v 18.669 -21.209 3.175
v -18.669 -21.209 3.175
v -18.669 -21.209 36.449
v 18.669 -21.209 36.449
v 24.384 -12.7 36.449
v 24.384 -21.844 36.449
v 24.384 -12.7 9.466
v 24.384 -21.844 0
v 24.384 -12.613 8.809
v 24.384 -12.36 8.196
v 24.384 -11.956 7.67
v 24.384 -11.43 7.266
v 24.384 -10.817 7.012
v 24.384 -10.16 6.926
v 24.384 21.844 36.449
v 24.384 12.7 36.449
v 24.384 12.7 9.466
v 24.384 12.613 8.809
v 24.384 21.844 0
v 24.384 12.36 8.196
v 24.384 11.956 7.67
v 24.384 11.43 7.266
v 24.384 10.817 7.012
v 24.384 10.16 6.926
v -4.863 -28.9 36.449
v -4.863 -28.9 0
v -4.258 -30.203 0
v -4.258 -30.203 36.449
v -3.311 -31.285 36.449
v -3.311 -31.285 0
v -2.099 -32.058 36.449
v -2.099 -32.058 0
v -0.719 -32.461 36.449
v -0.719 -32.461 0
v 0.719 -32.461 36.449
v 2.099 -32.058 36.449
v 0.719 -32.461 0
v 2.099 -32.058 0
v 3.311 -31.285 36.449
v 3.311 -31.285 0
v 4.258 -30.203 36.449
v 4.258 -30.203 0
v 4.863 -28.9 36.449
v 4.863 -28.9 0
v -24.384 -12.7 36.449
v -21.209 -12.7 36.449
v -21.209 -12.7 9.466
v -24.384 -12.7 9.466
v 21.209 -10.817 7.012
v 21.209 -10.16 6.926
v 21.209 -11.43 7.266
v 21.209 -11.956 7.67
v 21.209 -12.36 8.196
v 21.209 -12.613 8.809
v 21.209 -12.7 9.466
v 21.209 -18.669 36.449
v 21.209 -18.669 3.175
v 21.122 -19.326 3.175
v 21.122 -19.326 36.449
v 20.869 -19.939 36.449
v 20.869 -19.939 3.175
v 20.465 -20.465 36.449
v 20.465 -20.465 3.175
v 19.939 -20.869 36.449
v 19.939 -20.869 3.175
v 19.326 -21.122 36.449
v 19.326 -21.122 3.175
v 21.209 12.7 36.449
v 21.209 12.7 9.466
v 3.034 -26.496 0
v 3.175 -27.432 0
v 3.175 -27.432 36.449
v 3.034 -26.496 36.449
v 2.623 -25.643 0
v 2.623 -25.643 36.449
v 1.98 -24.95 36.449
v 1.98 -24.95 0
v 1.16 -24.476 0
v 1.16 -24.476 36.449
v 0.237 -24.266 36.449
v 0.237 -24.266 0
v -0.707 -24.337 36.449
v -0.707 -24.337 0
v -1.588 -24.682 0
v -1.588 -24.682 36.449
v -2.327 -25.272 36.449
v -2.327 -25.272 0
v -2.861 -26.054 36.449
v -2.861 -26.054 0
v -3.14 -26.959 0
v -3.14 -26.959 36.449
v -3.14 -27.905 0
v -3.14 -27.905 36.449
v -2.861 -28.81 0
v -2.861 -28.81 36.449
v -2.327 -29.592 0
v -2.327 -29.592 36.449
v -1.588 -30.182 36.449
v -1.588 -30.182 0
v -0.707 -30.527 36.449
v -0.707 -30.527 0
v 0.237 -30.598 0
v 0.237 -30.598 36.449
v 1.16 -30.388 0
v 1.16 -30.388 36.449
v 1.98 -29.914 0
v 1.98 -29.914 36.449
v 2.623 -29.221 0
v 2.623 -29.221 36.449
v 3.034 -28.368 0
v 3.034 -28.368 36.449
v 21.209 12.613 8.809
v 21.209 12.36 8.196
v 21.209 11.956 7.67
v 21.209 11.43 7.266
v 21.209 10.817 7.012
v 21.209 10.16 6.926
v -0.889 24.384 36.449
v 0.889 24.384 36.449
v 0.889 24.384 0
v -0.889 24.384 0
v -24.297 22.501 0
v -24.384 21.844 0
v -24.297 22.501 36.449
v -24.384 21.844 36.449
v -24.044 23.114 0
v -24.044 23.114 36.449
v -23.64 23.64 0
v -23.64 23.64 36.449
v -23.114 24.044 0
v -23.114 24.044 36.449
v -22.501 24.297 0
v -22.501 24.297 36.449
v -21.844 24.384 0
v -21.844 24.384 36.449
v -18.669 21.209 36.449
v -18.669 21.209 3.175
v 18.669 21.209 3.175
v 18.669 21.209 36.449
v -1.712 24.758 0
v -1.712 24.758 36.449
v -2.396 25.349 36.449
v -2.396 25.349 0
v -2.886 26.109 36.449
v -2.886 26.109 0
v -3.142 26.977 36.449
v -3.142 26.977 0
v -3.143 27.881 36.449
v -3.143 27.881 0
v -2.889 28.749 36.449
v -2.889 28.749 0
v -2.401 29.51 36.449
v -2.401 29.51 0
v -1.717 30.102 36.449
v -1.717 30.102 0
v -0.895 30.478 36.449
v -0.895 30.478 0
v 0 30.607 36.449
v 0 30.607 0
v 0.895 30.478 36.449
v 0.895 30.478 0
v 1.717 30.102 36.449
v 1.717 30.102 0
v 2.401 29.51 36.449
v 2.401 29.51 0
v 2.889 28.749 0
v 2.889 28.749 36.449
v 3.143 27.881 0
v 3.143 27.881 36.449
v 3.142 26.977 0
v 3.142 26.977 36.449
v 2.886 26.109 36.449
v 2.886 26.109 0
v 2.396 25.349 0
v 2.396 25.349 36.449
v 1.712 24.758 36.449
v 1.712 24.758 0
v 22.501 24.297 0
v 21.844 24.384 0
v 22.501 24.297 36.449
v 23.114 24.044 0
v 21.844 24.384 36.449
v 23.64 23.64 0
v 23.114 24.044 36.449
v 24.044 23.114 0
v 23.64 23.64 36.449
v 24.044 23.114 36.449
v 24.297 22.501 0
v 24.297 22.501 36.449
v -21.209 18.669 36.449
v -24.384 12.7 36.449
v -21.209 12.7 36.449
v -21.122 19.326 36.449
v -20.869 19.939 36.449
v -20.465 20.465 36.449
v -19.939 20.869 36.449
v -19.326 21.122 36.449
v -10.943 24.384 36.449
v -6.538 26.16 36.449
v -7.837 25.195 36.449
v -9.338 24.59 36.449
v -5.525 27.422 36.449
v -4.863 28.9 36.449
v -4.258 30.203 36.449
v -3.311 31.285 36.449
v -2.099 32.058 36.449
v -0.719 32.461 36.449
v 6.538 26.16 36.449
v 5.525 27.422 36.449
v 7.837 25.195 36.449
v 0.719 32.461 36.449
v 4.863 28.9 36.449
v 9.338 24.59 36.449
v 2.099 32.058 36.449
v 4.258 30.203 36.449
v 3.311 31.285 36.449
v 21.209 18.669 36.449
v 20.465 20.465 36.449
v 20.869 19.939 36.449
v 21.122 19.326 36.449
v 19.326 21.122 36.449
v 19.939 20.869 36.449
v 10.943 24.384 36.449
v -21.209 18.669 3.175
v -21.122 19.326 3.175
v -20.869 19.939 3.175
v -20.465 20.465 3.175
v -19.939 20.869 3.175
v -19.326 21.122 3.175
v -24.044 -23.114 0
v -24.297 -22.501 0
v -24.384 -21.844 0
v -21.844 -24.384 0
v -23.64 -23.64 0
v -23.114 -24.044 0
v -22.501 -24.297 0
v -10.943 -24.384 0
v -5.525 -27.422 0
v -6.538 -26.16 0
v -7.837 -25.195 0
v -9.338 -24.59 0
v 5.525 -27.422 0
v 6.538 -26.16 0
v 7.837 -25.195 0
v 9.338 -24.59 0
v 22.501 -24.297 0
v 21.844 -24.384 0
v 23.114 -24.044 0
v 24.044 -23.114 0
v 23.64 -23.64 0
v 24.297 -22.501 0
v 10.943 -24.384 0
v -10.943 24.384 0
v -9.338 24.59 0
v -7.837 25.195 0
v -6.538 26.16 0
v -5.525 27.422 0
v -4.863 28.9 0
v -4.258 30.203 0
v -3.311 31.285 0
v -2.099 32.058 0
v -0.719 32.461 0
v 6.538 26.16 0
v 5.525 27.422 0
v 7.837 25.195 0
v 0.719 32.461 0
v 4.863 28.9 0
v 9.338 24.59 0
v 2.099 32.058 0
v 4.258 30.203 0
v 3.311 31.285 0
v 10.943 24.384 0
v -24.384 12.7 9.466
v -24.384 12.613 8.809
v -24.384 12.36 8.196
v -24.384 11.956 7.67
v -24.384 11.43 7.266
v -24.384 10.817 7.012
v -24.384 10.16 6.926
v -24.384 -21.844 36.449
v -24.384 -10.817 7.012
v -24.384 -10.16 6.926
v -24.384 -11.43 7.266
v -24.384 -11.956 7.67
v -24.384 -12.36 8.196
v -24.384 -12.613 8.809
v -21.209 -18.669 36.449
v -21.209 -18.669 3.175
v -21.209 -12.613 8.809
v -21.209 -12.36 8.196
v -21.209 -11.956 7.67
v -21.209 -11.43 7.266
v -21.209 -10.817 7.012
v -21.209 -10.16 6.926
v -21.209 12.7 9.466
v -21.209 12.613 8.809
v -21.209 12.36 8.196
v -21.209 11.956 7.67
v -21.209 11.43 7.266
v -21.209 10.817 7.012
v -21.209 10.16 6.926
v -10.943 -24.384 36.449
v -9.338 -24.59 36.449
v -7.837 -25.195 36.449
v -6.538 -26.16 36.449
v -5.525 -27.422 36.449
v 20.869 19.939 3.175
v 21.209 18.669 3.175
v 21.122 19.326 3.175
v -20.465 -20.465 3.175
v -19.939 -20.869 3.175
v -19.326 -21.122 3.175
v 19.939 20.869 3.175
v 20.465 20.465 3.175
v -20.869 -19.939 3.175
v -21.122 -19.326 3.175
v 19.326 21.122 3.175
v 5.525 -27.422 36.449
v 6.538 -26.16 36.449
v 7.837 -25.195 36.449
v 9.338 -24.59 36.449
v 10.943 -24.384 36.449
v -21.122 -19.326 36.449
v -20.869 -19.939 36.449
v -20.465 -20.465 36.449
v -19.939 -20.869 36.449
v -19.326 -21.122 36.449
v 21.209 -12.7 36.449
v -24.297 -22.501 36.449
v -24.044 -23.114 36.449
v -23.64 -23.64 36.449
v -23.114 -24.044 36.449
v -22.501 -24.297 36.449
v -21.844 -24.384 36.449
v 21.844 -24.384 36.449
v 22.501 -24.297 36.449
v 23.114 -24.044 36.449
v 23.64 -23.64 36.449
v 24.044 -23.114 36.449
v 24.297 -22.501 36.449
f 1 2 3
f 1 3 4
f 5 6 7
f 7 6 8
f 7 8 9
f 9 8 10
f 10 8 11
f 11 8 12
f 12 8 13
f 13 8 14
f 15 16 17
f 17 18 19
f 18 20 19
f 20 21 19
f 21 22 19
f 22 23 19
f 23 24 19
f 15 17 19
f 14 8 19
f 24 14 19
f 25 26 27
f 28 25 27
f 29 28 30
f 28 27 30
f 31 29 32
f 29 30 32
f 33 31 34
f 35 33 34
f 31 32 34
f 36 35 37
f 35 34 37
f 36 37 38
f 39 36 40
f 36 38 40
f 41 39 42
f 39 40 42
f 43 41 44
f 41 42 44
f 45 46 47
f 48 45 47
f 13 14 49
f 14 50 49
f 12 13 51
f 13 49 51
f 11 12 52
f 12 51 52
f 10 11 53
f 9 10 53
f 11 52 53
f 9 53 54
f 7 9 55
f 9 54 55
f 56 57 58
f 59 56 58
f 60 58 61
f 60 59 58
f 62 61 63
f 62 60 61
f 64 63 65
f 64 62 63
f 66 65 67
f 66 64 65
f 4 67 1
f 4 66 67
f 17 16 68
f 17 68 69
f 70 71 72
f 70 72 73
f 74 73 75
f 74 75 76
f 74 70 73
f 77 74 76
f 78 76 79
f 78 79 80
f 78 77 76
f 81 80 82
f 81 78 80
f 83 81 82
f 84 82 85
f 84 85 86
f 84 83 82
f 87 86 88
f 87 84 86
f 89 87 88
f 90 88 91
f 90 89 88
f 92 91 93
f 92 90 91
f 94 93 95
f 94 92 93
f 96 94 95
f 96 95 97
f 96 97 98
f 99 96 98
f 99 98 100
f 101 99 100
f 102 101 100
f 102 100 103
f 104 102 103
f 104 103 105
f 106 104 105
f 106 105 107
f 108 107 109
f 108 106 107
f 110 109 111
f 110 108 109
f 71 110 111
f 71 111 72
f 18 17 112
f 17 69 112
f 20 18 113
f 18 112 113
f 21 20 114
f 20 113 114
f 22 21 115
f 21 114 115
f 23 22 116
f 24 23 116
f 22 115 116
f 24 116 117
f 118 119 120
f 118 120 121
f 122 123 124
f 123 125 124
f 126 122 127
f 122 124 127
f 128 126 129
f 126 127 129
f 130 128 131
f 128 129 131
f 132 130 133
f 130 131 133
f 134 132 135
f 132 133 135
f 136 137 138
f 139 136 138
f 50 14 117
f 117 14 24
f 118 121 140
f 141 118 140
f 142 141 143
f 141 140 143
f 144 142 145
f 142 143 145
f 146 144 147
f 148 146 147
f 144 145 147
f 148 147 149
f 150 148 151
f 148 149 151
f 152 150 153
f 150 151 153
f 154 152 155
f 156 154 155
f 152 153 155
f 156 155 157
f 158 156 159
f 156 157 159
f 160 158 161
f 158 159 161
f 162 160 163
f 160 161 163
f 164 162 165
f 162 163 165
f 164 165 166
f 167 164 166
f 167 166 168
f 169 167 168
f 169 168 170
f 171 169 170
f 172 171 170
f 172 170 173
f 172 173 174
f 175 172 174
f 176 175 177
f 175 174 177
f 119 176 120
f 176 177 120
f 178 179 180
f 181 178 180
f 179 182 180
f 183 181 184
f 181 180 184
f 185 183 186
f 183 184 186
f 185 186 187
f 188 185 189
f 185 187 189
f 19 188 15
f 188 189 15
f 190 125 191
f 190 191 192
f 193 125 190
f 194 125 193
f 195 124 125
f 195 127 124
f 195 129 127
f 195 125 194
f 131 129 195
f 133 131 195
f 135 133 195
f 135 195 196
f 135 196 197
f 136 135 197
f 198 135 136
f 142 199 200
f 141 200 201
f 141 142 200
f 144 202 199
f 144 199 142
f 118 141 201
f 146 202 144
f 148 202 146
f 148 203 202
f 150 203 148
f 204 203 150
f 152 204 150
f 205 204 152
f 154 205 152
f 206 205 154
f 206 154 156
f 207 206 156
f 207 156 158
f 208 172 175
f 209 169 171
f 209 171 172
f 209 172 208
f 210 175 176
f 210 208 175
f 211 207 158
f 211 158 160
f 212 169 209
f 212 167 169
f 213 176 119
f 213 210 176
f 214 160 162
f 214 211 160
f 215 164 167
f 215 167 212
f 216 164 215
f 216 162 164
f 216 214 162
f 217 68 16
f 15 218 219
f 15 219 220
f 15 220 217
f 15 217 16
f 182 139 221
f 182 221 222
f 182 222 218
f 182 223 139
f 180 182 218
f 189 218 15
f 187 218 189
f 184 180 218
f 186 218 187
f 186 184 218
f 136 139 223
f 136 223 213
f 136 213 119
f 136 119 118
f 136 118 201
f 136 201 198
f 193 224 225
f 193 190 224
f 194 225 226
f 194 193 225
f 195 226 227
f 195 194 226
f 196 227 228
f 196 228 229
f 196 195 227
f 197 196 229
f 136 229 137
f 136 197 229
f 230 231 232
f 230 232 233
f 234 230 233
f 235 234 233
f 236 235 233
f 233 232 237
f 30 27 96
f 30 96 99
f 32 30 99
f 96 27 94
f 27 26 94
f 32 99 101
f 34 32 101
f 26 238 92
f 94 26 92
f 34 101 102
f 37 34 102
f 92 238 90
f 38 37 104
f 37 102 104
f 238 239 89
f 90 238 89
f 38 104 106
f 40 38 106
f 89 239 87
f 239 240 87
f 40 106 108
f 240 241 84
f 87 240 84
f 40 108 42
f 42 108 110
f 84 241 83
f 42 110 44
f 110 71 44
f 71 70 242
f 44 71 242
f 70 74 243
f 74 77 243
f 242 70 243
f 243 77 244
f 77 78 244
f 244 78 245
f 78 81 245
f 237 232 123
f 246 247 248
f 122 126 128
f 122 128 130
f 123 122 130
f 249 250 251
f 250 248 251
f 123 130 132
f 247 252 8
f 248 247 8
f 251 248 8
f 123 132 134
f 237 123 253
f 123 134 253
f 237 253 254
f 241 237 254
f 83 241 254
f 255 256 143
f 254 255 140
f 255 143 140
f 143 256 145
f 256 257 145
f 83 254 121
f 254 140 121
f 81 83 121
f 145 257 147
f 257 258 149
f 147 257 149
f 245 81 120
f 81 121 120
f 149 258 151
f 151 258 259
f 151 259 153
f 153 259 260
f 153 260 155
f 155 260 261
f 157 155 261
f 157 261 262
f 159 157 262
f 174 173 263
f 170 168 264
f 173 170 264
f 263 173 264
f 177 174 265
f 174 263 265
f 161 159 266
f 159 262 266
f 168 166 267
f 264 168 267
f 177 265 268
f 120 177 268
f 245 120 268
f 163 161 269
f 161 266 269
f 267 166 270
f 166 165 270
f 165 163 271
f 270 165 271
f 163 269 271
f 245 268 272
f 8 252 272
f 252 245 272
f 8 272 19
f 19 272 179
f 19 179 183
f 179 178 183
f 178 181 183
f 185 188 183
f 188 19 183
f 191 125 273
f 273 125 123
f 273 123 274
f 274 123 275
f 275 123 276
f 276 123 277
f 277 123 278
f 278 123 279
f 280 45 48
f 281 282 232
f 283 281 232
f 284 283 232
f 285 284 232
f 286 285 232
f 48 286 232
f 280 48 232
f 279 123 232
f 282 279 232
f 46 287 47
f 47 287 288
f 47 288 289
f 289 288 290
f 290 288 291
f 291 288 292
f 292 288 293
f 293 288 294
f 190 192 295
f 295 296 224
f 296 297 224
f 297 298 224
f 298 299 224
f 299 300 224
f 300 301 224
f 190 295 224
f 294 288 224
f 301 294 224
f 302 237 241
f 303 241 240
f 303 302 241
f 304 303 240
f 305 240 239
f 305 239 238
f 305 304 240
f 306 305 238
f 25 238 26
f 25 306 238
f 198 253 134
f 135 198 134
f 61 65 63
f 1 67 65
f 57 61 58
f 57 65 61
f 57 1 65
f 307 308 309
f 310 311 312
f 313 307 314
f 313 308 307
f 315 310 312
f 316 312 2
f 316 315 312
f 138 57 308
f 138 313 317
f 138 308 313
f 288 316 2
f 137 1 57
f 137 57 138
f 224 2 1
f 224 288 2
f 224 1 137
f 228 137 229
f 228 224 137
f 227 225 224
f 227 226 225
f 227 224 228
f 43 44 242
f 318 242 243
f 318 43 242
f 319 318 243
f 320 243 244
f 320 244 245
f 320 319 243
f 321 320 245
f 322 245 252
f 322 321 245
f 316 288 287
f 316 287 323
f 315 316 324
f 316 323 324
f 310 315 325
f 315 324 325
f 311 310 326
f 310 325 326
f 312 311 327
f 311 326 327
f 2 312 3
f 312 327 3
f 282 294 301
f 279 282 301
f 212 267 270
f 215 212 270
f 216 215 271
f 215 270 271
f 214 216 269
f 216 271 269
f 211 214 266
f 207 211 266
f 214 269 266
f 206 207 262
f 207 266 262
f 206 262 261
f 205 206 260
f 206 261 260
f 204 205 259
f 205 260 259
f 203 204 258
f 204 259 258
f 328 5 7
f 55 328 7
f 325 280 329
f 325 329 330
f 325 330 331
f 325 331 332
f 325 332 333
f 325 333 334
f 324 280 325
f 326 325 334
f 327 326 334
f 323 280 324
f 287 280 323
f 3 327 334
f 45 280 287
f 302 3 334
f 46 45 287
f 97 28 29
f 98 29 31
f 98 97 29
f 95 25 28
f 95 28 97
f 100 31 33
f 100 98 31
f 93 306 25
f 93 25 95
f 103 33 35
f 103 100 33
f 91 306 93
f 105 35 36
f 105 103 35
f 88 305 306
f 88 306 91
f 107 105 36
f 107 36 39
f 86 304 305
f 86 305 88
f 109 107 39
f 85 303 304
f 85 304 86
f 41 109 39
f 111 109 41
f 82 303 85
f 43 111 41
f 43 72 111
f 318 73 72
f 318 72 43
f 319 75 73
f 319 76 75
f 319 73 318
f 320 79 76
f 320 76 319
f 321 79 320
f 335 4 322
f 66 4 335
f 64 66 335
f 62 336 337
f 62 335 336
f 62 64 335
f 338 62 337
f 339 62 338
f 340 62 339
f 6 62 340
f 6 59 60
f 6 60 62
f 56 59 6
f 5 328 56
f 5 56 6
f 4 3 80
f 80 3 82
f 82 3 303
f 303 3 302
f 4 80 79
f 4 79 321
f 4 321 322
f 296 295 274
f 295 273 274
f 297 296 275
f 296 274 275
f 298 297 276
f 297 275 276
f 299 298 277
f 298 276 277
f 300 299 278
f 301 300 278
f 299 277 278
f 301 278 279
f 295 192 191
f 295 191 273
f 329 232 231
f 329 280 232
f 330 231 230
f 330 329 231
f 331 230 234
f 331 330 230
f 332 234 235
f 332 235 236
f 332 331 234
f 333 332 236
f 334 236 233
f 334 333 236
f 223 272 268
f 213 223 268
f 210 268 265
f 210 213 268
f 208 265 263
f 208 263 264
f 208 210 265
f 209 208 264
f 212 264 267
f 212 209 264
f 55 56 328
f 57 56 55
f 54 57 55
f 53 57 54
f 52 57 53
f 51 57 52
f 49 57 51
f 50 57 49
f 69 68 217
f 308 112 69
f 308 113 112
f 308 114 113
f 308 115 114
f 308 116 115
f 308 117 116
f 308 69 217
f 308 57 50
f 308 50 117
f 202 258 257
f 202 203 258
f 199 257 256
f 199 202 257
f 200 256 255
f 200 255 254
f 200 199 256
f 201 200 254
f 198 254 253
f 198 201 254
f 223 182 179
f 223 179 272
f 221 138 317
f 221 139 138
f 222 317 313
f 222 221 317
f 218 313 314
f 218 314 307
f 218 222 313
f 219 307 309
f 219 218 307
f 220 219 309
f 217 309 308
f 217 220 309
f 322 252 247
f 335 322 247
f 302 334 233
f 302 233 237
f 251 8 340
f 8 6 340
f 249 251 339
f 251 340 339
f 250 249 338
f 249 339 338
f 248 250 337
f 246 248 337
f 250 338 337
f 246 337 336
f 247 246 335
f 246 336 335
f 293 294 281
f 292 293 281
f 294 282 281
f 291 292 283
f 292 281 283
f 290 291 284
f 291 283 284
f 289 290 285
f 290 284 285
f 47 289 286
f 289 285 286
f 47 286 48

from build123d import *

# Parameters (mm, degrees)
SKETCH1_W           = 42.418
SKETCH1_H           = 42.418
SKETCH1_R           = 3.175
BOSS_EXTRUDE1_DEPTH = 36.449
BOSS_EXTRUDE2_REACH = 68.815
SKETCH2_W           = 3.175
SKETCH2_H           = 42.418
SKETCH4_W           = 29.523081252
SKETCH4_H           = 25.4
CUT_EXTRUDE2_DEPTH  = 70.020848799
FILLET1_R           = 2.54
FILLET2_R           = 6.35


with BuildPart() as part:
    # Sketch1 → Boss-Extrude1 (new body)
    with BuildSketch(Plane.XY):
        with BuildLine():
            Line((4.064, -24.384), (24.384, -24.384))
            Line((24.384, -24.384), (24.384, 24.384))
            Line((24.384, 24.384), (4.064, 24.384))
            ThreePointArc((4.064, 24.384), (0, 32.512), (-4.064, 24.384))
            Line((-4.064, 24.384), (-24.384, 24.384))
            Line((-24.384, 24.384), (-24.384, -24.384))
            Line((-24.384, -24.384), (-4.064, -24.384))
            ThreePointArc((-4.064, -24.384), (0, -32.512), (4.064, -24.384))
        make_face()
        with BuildLine():
            ThreePointArc((-0.889, 24.384), (0, 30.607), (0.889, 24.384))
            Line((0.889, 24.384), (-0.889, 24.384))
        make_face(mode=Mode.SUBTRACT)
        Rectangle(SKETCH1_W, SKETCH1_H, mode=Mode.SUBTRACT)
        with Locations((0, -27.432)):
            Circle(SKETCH1_R, mode=Mode.SUBTRACT)
    extrude(amount=BOSS_EXTRUDE1_DEPTH)

    # Sketch2 → Boss-Extrude2 (add, up to next)
    with BuildSketch(Plane(origin=(-21.209, 0, 0), x_dir=(0, 0, -1), z_dir=(1, 0, 0)), mode=Mode.PRIVATE) as boss_extrude2_sk1:
        with Locations((-1.5875, 0)):
            Rectangle(SKETCH2_W, SKETCH2_H)
    boss_extrude2_tool1 = extrude(boss_extrude2_sk1.sketch, amount=BOSS_EXTRUDE2_REACH, mode=Mode.PRIVATE) - part.part
    add(boss_extrude2_tool1.solids().sort_by_distance((-21.209, 0, 1.5875))[0])

    # Sketch4 → Cut-Extrude2 (cut, through all)
    with BuildSketch(Plane(origin=(24.384, 0, 0), x_dir=(0, 0, -1), z_dir=(1, 0, 0))):
        with Locations((-21.687459374, 0)):
            Rectangle(SKETCH4_W, SKETCH4_H)
    extrude(amount=-CUT_EXTRUDE2_DEPTH, mode=Mode.SUBTRACT)

    # Fillet1
    fillet1_edges = [part.edges().sort_by_distance(p)[0] for p in [
        (-21.209, -21.209, 19.812),
        (21.209, -21.209, 19.812),
        (21.209, 21.209, 19.812),
        (-21.209, 21.209, 19.812),
        (24.384, 24.384, 18.2245),
        (24.384, -24.384, 18.2245),
        (-24.384, -24.384, 18.2245),
        (-24.384, 24.384, 18.2245),
        (22.7965, 12.7, 6.925918748),
        (22.7965, -12.7, 6.925918748),
        (-22.7965, 12.7, 6.925918748),
        (-22.7965, -12.7, 6.925918748),
    ]]
    fillet(fillet1_edges, radius=FILLET1_R)

    # Fillet2
    fillet2_edges = [part.edges().sort_by_distance(p)[0] for p in [
        (4.064, 24.384, 18.2245),
        (4.064, -24.384, 18.2245),
        (-4.064, -24.384, 18.2245),
        (-4.064, 24.384, 18.2245),
    ]]
    fillet(fillet2_edges, radius=FILLET2_R)


solid = part.part
